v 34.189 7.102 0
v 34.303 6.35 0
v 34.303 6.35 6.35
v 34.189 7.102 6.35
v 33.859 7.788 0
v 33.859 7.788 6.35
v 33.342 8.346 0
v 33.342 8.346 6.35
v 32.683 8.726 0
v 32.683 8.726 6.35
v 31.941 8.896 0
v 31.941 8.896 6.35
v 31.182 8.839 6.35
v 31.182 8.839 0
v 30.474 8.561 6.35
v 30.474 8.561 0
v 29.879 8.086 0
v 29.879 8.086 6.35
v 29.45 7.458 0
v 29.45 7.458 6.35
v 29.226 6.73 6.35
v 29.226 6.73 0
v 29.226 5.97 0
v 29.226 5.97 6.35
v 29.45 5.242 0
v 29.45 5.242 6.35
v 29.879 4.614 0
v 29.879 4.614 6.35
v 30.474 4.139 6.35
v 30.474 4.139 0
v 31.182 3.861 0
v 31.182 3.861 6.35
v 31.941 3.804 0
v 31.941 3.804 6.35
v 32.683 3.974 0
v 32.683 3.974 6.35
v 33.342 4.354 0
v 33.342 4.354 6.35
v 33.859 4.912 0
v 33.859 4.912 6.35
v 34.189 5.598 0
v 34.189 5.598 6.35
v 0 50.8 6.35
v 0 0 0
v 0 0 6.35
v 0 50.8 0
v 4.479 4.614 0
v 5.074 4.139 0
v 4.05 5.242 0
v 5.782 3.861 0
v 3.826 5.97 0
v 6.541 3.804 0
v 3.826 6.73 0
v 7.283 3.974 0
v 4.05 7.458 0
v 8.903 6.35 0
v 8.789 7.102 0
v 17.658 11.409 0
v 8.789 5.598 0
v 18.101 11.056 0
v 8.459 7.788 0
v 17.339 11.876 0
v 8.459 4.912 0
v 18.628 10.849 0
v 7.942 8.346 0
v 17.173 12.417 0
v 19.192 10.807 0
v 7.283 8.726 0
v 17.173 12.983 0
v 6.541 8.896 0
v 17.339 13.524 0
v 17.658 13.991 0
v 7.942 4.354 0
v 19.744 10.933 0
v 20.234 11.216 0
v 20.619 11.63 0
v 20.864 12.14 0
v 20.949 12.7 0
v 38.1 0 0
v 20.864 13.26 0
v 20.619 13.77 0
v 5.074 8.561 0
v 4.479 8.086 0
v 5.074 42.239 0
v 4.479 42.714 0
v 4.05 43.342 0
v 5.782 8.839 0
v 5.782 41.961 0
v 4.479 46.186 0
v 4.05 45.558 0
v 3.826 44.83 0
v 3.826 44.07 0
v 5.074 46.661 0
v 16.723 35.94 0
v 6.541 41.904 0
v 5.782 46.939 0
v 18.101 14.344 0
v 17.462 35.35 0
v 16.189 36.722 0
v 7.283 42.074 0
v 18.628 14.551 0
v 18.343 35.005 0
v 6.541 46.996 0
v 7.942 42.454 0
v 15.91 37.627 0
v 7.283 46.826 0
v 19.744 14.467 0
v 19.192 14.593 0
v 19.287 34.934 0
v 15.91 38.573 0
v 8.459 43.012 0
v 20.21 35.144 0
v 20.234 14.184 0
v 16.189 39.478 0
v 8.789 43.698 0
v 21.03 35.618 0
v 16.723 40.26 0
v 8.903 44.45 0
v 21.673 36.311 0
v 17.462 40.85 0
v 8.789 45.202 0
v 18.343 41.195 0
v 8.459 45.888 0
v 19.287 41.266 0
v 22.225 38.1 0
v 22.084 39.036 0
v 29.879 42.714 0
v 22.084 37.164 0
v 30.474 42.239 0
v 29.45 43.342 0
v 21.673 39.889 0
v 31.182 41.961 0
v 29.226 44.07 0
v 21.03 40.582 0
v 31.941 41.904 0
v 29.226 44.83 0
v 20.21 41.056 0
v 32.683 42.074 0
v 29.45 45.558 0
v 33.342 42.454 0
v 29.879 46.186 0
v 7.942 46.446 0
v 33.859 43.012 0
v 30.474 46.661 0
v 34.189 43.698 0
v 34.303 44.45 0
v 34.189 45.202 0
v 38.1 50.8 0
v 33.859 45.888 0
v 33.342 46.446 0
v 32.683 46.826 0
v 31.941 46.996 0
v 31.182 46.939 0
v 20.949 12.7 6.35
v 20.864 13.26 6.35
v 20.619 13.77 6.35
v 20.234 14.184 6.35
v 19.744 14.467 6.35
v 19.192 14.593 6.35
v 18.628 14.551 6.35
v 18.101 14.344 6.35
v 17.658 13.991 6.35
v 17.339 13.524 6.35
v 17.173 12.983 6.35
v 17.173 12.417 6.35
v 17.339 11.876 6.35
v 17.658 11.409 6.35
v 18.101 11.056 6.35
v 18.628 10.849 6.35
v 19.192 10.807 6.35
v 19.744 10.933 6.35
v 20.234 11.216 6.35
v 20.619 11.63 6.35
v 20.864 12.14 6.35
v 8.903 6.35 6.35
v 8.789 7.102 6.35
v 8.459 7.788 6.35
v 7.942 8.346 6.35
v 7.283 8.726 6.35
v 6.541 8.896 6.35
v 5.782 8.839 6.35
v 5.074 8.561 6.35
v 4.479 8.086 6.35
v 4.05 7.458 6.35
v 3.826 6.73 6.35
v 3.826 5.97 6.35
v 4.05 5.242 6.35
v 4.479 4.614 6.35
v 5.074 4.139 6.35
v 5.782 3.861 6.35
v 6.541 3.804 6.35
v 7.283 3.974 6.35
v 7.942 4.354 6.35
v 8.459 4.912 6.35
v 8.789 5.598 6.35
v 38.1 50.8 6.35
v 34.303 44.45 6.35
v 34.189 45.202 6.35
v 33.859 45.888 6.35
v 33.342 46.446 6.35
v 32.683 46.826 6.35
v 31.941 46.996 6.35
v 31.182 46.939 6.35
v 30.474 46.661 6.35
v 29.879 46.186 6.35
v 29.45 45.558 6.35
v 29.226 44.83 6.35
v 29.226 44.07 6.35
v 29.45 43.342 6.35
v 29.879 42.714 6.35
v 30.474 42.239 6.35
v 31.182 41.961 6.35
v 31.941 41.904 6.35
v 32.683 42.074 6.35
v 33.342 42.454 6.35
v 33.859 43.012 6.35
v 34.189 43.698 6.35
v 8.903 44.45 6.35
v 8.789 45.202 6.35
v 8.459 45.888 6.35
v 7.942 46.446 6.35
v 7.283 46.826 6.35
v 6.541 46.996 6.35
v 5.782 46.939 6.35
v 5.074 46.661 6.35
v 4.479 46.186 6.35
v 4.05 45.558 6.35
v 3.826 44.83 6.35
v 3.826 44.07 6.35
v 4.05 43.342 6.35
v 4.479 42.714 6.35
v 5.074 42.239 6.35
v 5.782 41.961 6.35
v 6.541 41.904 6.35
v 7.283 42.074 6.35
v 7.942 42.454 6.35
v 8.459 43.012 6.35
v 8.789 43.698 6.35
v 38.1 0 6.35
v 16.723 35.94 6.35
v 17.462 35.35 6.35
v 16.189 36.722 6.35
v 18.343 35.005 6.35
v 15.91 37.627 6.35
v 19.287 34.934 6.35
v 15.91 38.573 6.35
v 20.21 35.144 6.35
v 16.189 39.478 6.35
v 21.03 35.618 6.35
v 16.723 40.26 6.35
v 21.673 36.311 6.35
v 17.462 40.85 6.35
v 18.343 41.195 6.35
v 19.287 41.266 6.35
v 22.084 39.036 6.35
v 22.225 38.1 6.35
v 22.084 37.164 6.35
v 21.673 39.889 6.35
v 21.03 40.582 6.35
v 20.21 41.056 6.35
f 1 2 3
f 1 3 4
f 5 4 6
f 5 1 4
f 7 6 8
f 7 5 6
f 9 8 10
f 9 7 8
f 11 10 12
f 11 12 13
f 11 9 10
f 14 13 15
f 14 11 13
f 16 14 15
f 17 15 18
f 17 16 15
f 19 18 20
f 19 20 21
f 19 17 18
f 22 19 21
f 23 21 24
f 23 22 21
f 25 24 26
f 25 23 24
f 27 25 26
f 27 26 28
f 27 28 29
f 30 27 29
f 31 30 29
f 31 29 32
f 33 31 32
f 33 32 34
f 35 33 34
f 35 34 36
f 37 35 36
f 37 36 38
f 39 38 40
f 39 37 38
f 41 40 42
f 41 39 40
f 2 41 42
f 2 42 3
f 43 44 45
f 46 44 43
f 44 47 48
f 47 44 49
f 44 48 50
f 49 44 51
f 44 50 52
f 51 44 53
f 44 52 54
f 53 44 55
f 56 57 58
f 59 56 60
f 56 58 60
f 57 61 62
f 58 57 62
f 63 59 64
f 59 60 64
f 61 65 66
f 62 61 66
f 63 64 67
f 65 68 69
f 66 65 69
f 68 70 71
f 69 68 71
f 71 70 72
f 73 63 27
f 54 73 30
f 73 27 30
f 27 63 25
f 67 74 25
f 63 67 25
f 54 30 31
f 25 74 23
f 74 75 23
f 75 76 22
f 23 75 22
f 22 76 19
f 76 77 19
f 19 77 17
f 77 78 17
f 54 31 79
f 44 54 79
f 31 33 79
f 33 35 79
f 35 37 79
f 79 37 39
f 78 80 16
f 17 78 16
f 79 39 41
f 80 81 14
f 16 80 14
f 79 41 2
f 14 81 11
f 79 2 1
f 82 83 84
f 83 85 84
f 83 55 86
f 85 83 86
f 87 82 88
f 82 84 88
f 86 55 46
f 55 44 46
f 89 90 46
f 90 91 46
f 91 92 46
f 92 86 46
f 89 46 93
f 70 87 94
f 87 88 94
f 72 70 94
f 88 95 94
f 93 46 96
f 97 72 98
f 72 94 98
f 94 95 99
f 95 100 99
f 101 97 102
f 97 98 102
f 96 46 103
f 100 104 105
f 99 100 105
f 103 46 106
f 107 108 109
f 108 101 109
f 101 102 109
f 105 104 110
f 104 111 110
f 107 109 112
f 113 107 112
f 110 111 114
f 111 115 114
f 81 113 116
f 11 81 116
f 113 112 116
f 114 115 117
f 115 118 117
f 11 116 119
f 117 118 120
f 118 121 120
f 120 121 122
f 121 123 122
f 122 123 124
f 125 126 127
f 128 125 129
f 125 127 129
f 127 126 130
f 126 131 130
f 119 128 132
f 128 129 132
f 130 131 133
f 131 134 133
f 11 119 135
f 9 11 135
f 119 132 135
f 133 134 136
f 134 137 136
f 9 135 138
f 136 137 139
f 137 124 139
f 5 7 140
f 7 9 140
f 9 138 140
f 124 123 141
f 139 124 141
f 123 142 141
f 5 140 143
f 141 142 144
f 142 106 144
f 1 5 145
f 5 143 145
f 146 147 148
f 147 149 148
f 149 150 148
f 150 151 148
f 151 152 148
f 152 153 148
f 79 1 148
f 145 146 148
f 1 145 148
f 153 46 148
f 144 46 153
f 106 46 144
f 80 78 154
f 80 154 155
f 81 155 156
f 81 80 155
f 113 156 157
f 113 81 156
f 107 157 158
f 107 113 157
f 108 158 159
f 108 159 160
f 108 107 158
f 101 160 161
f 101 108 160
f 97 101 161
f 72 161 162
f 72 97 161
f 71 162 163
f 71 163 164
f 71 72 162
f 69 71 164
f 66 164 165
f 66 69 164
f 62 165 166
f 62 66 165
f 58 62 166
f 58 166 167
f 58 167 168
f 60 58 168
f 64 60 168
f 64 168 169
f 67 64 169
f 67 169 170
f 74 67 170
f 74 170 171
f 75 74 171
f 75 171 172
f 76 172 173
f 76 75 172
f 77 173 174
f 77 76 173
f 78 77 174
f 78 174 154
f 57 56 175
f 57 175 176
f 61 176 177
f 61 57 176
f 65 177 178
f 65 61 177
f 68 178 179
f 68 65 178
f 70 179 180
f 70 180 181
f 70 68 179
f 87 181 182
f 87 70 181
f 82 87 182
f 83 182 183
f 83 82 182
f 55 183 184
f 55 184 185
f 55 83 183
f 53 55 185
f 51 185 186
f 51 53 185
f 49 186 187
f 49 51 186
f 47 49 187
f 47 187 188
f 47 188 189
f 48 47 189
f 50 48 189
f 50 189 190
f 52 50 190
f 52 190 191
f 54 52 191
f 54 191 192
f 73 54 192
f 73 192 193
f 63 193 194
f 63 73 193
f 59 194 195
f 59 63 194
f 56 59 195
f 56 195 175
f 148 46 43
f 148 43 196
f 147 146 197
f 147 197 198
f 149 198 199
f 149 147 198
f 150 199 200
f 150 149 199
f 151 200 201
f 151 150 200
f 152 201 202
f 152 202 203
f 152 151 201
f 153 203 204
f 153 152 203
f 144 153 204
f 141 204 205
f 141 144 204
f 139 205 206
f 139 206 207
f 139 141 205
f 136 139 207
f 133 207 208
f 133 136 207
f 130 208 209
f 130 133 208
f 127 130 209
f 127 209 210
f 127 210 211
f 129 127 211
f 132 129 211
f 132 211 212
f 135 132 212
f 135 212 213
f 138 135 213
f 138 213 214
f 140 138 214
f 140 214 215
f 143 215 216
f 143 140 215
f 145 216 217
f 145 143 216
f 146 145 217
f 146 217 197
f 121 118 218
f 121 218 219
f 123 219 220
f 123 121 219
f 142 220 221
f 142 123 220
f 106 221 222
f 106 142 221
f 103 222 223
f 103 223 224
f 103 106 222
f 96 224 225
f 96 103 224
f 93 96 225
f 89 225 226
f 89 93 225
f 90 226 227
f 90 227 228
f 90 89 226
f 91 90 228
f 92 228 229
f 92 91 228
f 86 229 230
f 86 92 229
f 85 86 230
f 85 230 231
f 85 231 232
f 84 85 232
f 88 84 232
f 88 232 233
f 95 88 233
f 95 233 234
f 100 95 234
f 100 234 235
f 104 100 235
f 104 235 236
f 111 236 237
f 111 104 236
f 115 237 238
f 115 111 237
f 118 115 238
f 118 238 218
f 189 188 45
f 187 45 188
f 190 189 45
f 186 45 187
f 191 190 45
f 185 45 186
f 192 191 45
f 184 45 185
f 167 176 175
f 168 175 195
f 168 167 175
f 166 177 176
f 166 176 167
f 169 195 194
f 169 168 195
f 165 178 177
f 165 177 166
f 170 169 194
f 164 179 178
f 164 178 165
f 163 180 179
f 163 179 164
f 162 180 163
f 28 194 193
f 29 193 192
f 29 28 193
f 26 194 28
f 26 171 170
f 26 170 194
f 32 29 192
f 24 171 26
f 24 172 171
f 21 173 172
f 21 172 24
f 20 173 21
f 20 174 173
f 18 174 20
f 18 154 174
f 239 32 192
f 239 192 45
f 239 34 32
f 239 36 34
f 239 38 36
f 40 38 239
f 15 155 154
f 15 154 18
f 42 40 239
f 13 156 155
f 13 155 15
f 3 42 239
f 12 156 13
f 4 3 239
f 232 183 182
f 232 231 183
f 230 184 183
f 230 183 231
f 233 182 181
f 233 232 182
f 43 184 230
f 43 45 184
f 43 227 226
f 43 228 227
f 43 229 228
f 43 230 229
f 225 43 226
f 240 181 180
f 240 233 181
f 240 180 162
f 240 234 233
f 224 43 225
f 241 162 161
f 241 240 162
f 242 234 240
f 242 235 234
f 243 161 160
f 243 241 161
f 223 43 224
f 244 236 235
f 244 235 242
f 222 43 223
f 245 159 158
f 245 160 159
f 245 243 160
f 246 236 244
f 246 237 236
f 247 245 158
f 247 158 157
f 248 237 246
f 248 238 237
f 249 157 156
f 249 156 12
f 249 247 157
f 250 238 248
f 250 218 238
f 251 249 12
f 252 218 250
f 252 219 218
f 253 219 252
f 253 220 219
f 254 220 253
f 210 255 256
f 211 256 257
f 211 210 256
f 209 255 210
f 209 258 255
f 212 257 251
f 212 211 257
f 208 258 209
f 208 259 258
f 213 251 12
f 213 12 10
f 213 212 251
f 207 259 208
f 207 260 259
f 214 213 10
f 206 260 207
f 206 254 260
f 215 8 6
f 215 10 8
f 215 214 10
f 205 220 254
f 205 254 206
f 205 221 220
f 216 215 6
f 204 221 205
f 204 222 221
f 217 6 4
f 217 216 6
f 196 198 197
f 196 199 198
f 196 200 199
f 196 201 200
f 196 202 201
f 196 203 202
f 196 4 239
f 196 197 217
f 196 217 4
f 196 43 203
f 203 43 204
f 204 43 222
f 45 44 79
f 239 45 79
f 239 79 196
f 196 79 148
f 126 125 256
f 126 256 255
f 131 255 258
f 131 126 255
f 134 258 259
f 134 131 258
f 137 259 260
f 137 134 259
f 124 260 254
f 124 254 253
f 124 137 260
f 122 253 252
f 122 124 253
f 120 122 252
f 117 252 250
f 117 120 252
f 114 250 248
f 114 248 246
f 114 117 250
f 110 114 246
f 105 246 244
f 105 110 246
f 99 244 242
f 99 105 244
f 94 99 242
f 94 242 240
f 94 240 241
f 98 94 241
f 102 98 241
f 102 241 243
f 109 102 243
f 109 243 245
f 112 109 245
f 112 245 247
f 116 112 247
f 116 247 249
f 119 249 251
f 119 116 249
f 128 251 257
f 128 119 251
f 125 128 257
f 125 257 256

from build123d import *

# Parameters (mm, degrees)
SKETCH3_W           = 38.1
SKETCH3_H           = 50.8
SKETCH3_R           = 2.5527
SKETCH3_R_2         = 3.175
SKETCH3_R_3         = 1.89865
BOSS_EXTRUDE4_DEPTH = 6.35


with BuildPart() as part:
    # Sketch3 → Boss-Extrude4 (new body)
    with BuildSketch(Plane.XY):
        with Locations((19.05, 25.4)):
            Rectangle(SKETCH3_W, SKETCH3_H)
        with Locations((6.35, 44.45)):
            Circle(SKETCH3_R, mode=Mode.SUBTRACT)
        with Locations((31.75, 44.45)):
            Circle(SKETCH3_R, mode=Mode.SUBTRACT)
        with Locations((31.75, 6.35)):
            Circle(SKETCH3_R, mode=Mode.SUBTRACT)
        with Locations((6.35, 6.35)):
            Circle(SKETCH3_R, mode=Mode.SUBTRACT)
        with Locations((19.05, 38.1)):
            Circle(SKETCH3_R_2, mode=Mode.SUBTRACT)
        with Locations((19.05, 12.7)):
            Circle(SKETCH3_R_3, mode=Mode.SUBTRACT)
    extrude(amount=BOSS_EXTRUDE4_DEPTH)


solid = part.part
